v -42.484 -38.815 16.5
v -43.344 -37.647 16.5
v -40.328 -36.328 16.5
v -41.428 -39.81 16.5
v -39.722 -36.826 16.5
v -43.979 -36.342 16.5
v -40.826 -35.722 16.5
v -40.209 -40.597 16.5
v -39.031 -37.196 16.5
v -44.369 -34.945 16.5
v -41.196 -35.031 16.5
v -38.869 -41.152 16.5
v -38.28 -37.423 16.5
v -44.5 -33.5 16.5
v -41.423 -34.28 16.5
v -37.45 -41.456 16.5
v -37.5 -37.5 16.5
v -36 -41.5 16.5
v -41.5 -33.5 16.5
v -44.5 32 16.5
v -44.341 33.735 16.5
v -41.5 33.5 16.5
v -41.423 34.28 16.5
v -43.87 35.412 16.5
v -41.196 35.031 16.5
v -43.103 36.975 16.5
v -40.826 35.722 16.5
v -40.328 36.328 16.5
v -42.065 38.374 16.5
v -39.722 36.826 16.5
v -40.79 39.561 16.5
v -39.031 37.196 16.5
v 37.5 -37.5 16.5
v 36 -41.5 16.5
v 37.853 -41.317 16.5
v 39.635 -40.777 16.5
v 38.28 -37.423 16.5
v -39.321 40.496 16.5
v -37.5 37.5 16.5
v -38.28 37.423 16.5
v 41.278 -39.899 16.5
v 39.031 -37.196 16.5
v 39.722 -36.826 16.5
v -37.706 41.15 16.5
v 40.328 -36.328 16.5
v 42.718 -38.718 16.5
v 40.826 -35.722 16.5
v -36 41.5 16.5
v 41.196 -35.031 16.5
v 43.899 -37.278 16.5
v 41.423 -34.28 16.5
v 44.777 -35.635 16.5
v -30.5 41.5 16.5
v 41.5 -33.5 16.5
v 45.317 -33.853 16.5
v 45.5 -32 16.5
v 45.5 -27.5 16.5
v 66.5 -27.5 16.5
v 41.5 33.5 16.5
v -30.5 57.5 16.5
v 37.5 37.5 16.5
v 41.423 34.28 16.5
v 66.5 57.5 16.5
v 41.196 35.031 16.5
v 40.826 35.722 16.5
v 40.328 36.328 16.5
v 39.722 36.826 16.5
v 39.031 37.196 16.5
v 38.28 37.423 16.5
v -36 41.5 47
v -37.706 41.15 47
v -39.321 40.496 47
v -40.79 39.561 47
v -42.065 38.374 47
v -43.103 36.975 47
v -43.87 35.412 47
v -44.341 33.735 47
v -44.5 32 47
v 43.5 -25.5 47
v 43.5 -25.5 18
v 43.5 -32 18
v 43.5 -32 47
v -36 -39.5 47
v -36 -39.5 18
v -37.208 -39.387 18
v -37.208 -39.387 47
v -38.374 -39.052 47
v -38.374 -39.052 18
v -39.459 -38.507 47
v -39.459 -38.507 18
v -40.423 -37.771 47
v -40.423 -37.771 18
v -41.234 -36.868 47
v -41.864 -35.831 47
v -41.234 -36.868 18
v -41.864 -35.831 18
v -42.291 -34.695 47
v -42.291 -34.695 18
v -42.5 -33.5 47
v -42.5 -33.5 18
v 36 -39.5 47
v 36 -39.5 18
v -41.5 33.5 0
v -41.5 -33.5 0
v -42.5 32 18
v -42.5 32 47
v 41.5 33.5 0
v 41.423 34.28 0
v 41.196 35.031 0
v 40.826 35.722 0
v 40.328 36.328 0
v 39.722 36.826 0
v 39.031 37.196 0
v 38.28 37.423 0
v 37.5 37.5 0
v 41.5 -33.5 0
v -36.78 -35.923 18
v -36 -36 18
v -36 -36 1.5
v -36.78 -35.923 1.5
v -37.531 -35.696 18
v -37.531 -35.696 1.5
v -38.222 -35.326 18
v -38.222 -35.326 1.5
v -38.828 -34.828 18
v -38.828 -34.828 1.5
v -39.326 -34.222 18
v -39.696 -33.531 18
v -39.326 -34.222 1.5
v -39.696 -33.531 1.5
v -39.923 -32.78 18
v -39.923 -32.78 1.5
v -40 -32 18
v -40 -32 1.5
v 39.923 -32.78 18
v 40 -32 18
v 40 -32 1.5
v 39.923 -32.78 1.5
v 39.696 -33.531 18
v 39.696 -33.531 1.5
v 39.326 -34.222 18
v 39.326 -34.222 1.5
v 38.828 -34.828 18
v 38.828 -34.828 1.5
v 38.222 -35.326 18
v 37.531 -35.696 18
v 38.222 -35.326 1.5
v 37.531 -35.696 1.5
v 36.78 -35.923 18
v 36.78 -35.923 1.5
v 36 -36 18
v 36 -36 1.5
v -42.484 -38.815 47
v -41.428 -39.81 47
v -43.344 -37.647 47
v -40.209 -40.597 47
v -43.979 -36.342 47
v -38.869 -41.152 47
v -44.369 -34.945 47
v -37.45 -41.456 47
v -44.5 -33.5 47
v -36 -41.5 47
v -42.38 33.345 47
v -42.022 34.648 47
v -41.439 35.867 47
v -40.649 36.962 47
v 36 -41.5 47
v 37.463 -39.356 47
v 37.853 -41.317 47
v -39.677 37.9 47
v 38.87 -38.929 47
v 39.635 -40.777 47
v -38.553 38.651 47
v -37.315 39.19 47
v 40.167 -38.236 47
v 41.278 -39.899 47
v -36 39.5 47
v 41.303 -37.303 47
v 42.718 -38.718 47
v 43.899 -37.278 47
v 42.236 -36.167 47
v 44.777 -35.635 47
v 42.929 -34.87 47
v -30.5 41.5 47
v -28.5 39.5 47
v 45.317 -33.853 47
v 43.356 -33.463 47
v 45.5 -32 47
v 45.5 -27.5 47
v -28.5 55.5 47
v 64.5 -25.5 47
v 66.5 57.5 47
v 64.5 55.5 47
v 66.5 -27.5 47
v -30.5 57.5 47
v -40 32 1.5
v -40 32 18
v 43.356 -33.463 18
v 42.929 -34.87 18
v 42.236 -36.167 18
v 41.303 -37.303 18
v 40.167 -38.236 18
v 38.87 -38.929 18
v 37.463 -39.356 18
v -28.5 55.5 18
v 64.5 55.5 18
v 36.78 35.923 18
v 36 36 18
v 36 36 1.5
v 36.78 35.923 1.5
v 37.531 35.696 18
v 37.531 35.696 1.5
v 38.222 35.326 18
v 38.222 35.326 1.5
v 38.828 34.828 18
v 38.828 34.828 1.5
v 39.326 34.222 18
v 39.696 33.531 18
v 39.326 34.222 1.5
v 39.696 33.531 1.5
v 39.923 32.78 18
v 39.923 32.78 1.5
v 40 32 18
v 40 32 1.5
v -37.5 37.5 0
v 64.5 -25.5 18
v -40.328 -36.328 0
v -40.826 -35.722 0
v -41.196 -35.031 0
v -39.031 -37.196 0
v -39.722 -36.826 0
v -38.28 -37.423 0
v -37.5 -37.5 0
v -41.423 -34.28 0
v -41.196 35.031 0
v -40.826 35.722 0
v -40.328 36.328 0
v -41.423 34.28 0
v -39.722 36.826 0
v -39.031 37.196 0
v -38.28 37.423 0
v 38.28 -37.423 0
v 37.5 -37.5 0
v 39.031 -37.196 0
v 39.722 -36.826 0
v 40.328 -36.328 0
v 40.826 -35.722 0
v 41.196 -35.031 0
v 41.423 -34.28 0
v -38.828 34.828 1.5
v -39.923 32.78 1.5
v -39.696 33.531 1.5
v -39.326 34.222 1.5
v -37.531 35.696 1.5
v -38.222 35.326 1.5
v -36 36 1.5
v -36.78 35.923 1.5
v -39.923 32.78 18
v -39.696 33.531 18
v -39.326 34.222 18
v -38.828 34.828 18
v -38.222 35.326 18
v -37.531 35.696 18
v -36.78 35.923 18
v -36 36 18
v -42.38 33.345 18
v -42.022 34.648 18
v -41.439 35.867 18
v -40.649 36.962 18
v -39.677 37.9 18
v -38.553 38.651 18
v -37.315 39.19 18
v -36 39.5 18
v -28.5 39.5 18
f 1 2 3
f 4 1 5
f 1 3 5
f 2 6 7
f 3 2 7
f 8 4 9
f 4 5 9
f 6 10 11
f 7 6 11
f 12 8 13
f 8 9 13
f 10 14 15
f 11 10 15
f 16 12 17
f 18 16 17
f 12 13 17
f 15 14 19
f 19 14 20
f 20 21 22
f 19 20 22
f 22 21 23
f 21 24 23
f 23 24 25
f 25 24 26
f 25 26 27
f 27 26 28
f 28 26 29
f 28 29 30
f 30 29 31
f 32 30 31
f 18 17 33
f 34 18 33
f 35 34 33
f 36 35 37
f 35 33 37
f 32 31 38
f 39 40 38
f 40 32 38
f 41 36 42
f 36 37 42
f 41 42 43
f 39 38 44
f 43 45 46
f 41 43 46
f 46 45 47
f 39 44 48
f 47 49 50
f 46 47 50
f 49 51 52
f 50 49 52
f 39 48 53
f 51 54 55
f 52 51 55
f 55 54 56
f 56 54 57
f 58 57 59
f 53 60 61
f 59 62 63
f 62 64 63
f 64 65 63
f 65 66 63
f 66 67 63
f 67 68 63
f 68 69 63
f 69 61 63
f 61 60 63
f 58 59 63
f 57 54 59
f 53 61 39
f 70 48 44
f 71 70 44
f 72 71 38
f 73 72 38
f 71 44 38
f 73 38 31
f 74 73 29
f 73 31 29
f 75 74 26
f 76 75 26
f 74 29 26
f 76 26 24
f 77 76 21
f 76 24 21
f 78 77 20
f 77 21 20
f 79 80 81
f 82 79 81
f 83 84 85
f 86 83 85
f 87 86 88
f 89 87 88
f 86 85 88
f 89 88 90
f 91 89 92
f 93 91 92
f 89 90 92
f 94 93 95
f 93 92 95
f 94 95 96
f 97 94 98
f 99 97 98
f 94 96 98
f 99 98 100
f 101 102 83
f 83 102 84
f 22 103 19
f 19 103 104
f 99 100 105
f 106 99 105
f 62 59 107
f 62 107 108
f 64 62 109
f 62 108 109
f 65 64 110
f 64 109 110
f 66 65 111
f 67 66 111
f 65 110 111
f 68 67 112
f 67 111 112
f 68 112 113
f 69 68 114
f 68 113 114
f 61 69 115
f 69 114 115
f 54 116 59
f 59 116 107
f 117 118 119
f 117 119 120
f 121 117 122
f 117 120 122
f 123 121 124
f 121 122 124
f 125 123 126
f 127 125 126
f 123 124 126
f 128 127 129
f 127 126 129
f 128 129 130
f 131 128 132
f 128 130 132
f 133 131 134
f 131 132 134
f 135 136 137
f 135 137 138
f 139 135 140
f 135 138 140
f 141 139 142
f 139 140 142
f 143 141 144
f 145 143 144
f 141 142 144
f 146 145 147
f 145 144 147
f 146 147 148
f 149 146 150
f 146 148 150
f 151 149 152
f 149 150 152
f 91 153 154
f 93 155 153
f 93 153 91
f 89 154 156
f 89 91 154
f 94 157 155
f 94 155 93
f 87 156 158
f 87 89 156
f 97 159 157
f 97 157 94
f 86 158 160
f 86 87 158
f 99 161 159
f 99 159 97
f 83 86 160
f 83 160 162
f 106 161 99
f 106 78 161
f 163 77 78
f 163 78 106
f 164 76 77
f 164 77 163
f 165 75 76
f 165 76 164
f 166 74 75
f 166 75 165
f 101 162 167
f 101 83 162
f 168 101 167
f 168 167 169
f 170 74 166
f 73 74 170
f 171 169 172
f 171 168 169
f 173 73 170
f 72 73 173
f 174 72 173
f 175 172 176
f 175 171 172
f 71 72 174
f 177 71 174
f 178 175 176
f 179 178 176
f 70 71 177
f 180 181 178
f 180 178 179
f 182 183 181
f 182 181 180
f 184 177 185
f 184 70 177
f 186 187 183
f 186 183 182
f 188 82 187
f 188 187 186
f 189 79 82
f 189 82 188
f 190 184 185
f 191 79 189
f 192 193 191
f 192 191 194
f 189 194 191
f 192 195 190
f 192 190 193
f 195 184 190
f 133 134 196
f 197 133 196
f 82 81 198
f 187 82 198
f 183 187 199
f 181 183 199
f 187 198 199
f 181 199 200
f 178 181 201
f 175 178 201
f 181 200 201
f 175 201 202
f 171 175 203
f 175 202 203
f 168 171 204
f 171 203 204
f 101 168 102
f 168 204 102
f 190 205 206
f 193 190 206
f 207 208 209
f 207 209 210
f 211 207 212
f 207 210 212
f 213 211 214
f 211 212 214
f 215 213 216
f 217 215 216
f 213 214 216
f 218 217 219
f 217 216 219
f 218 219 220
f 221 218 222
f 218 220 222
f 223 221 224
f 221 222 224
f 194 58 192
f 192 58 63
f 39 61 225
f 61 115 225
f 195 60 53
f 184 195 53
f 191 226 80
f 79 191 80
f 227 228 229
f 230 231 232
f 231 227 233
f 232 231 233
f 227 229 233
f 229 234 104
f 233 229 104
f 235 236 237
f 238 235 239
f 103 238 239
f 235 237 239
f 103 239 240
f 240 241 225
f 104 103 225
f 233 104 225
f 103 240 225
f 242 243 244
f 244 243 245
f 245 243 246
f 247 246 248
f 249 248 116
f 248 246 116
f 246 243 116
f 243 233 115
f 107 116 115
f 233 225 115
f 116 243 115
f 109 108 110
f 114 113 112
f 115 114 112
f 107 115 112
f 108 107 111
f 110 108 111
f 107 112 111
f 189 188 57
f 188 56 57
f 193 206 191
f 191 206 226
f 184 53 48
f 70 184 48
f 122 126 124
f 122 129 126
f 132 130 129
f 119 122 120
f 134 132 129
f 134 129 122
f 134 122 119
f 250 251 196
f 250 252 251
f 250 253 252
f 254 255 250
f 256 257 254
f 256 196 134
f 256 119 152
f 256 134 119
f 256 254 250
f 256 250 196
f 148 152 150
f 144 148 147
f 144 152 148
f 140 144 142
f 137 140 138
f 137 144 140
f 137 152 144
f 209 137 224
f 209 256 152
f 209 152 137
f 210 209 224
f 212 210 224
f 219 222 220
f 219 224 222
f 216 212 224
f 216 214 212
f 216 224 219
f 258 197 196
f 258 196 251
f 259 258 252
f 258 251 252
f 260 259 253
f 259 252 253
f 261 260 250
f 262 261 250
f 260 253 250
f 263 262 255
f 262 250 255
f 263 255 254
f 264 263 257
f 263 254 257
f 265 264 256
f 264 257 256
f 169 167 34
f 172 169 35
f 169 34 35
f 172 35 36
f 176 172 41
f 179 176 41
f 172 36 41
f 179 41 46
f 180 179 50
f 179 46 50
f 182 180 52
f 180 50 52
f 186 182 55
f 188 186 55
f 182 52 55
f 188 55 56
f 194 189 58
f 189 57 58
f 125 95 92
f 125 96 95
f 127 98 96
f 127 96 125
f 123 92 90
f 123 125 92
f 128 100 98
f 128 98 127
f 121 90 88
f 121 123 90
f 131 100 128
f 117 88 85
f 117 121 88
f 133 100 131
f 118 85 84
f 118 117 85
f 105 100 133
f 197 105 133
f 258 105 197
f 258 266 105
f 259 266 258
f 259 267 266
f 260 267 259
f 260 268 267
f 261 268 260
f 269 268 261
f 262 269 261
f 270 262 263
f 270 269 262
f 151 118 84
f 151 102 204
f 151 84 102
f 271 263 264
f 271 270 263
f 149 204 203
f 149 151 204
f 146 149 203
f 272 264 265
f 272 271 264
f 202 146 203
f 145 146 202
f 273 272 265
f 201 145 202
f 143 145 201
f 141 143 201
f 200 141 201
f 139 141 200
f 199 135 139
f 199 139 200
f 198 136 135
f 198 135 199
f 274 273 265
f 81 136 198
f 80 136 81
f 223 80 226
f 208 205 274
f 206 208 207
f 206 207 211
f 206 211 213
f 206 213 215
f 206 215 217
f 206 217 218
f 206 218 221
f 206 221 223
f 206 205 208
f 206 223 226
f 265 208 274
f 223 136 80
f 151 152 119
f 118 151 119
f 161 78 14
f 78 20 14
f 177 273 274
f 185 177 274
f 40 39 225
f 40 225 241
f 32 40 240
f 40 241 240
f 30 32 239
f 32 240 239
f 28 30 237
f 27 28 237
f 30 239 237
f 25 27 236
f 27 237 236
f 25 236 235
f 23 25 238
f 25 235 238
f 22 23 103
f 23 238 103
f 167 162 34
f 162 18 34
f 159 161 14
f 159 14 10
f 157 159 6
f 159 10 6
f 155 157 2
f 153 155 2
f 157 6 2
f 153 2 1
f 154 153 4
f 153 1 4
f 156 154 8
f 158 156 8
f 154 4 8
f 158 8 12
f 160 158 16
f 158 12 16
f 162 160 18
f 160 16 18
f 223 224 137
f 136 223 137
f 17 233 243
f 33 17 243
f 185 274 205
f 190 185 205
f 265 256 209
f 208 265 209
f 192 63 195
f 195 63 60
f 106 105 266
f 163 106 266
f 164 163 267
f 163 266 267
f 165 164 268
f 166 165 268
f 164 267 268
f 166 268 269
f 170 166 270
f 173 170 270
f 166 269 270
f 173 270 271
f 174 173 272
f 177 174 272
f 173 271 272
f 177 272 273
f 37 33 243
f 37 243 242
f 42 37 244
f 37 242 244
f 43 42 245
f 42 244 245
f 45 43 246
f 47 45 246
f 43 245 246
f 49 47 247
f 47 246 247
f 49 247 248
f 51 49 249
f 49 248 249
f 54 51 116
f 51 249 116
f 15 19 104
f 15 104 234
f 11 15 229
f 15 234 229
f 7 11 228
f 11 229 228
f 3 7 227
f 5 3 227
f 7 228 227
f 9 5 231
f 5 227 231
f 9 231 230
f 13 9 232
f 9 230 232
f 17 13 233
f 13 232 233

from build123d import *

# Parameters (mm, degrees)
F1_DEPTH = 1.5
F3_DEPTH = 15
F5_DEPTH = 1.5
F7_DEPTH = 29
F8_DEPTH = 29


with BuildPart() as f1:
    # F0 (on Top) → F1 (new body)
    with BuildSketch(Plane.XY):
        with BuildLine():
            ThreePointArc((41.5, 33.5), (40.3284271247, 36.3284271247), (37.5, 37.5))
            Line((37.5, 37.5), (-37.5, 37.5))
            ThreePointArc((-37.5, 37.5), (-40.3284271247, 36.3284271247), (-41.5, 33.5))
            Line((-41.5, 33.5), (-41.5, -33.5))
            ThreePointArc((-41.5, -33.5), (-40.3284271247, -36.3284271247), (-37.5, -37.5))
            Line((-37.5, -37.5), (37.5, -37.5))
            ThreePointArc((37.5, -37.5), (40.3284271247, -36.3284271247), (41.5, -33.5))
            Line((41.5, -33.5), (41.5, 33.5))
        make_face()
    extrude(amount=F1_DEPTH)

    # F2 (on face) → F3 (join)
    with BuildSketch(Plane.XY.offset(1.5)):
        with BuildLine():
            Line((41.5, -33.5), (41.5, 33.5))
            ThreePointArc((41.5, 33.5), (40.3284271247, 36.3284271247), (37.5, 37.5))
            Line((37.5, 37.5), (-37.5, 37.5))
            ThreePointArc((-37.5, 37.5), (-40.3284271247, 36.3284271247), (-41.5, 33.5))
            Line((-41.5, 33.5), (-41.5, -33.5))
            ThreePointArc((-41.5, -33.5), (-40.3284271247, -36.3284271247), (-37.5, -37.5))
            Line((-37.5, -37.5), (37.5, -37.5))
            ThreePointArc((37.5, -37.5), (40.3284271247, -36.3284271247), (41.5, -33.5))
        make_face()
        with BuildLine():
            Line((-36, 36), (36, 36))
            ThreePointArc((36, 36), (38.8284271247, 34.8284271247), (40, 32))
            Line((40, 32), (40, -32))
            ThreePointArc((40, -32), (38.8284271247, -34.8284271247), (36, -36))
            Line((36, -36), (-36, -36))
            ThreePointArc((-36, -36), (-38.8284271247, -34.8284271247), (-40, -32))
            Line((-40, -32), (-40, 32))
            ThreePointArc((-40, 32), (-38.8284271247, 34.8284271247), (-36, 36))
        make_face(mode=Mode.SUBTRACT)
    extrude(amount=F3_DEPTH)

    # F4 (on face) → F5 (join)
    with BuildSketch(Plane.XY.offset(16.5)):
        with BuildLine():
            Line((45.5, -32), (45.5, -27.5))
            Line((45.5, -27.5), (66.5, -27.5))
            Line((66.5, -27.5), (66.5, 57.5))
            Line((66.5, 57.5), (-30.5, 57.5))
            Line((-30.5, 57.5), (-30.5, 41.5))
            Line((-30.5, 41.5), (-36, 41.5))
            ThreePointArc((-36, 41.5), (-42.0648066734, 38.373774392), (-44.5, 32))
            Line((-44.5, 32), (-44.5, -33.5))
            ThreePointArc((-44.5, -33.5), (-41.9782906023, -39.336308765), (-36, -41.5))
            Line((-36, -41.5), (36, -41.5))
            ThreePointArc((36, -41.5), (42.7175144213, -38.7175144213), (45.5, -32))
        make_face()
        with BuildLine():
            Line((41.5, 33.5), (41.5, -33.5))
            ThreePointArc((41.5, -33.5), (40.3284271247, -36.3284271247), (37.5, -37.5))
            Line((37.5, -37.5), (-37.5, -37.5))
            ThreePointArc((-37.5, -37.5), (-40.3284271247, -36.3284271247), (-41.5, -33.5))
            Line((-41.5, -33.5), (-41.5, 33.5))
            ThreePointArc((-41.5, 33.5), (-40.3284271247, 36.3284271247), (-37.5, 37.5))
            Line((-37.5, 37.5), (37.5, 37.5))
            ThreePointArc((37.5, 37.5), (40.3284271247, 36.3284271247), (41.5, 33.5))
        make_face(mode=Mode.SUBTRACT)
        with BuildLine():
            ThreePointArc((37.5, -37.5), (40.3284271247, -36.3284271247), (41.5, -33.5))
            Line((41.5, -33.5), (41.5, 33.5))
            ThreePointArc((41.5, 33.5), (40.3284271247, 36.3284271247), (37.5, 37.5))
            Line((37.5, 37.5), (-37.5, 37.5))
            ThreePointArc((-37.5, 37.5), (-40.3284271247, 36.3284271247), (-41.5, 33.5))
            Line((-41.5, 33.5), (-41.5, -33.5))
            ThreePointArc((-41.5, -33.5), (-40.3284271247, -36.3284271247), (-37.5, -37.5))
            Line((-37.5, -37.5), (37.5, -37.5))
        make_face()
        with BuildLine():
            ThreePointArc((-40, 32), (-38.8284271247, 34.8284271247), (-36, 36))
            Line((-36, 36), (36, 36))
            ThreePointArc((36, 36), (38.8284271247, 34.8284271247), (40, 32))
            Line((40, 32), (40, -32))
            ThreePointArc((40, -32), (38.8284271247, -34.8284271247), (36, -36))
            Line((36, -36), (-36, -36))
            ThreePointArc((-36, -36), (-38.8284271247, -34.8284271247), (-40, -32))
            Line((-40, -32), (-40, 32))
        make_face(mode=Mode.SUBTRACT)
    extrude(amount=F5_DEPTH)

    # F6 (on face) → F7 (join)
    with BuildSketch(Plane.XY.offset(18)):
        Polygon((-36, 41.5), (-36, 39.5), (-28.5, 39.5), (-28.5, 55.5), (64.5, 55.5), (64.5, -25.5), (43.5, -25.5), (43.5, -32), (45.5, -32), (45.5, -27.5), (66.5, -27.5), (66.5, 57.5), (-30.5, 57.5), (-30.5, 41.5), align=None)
    extrude(amount=F7_DEPTH)

    # F6 (on face) → F8 (join)
    with BuildSketch(Plane.XY.offset(18)):
        with BuildLine():
            ThreePointArc((-42.5, 32), (-40.6488749734, 36.9623583103), (-36, 39.5))
            Line((-36, 39.5), (-36, 41.5))
            ThreePointArc((-36, 41.5), (-42.0648066734, 38.373774392), (-44.5, 32))
            Line((-44.5, 32), (-44.5, -33.5))
            ThreePointArc((-44.5, -33.5), (-41.9782906023, -39.336308765), (-36, -41.5))
            Line((-36, -41.5), (36, -41.5))
            ThreePointArc((36, -41.5), (42.7175144213, -38.7175144213), (45.5, -32))
            Line((45.5, -32), (43.5, -32))
            ThreePointArc((43.5, -32), (41.3033008589, -37.3033008589), (36, -39.5))
            Line((36, -39.5), (-36, -39.5))
            ThreePointArc((-36, -39.5), (-40.4229515032, -37.7706974618), (-42.5, -33.5))
            Line((-42.5, -33.5), (-42.5, 32))
        make_face()
    extrude(amount=F8_DEPTH)


solid = f1.part
